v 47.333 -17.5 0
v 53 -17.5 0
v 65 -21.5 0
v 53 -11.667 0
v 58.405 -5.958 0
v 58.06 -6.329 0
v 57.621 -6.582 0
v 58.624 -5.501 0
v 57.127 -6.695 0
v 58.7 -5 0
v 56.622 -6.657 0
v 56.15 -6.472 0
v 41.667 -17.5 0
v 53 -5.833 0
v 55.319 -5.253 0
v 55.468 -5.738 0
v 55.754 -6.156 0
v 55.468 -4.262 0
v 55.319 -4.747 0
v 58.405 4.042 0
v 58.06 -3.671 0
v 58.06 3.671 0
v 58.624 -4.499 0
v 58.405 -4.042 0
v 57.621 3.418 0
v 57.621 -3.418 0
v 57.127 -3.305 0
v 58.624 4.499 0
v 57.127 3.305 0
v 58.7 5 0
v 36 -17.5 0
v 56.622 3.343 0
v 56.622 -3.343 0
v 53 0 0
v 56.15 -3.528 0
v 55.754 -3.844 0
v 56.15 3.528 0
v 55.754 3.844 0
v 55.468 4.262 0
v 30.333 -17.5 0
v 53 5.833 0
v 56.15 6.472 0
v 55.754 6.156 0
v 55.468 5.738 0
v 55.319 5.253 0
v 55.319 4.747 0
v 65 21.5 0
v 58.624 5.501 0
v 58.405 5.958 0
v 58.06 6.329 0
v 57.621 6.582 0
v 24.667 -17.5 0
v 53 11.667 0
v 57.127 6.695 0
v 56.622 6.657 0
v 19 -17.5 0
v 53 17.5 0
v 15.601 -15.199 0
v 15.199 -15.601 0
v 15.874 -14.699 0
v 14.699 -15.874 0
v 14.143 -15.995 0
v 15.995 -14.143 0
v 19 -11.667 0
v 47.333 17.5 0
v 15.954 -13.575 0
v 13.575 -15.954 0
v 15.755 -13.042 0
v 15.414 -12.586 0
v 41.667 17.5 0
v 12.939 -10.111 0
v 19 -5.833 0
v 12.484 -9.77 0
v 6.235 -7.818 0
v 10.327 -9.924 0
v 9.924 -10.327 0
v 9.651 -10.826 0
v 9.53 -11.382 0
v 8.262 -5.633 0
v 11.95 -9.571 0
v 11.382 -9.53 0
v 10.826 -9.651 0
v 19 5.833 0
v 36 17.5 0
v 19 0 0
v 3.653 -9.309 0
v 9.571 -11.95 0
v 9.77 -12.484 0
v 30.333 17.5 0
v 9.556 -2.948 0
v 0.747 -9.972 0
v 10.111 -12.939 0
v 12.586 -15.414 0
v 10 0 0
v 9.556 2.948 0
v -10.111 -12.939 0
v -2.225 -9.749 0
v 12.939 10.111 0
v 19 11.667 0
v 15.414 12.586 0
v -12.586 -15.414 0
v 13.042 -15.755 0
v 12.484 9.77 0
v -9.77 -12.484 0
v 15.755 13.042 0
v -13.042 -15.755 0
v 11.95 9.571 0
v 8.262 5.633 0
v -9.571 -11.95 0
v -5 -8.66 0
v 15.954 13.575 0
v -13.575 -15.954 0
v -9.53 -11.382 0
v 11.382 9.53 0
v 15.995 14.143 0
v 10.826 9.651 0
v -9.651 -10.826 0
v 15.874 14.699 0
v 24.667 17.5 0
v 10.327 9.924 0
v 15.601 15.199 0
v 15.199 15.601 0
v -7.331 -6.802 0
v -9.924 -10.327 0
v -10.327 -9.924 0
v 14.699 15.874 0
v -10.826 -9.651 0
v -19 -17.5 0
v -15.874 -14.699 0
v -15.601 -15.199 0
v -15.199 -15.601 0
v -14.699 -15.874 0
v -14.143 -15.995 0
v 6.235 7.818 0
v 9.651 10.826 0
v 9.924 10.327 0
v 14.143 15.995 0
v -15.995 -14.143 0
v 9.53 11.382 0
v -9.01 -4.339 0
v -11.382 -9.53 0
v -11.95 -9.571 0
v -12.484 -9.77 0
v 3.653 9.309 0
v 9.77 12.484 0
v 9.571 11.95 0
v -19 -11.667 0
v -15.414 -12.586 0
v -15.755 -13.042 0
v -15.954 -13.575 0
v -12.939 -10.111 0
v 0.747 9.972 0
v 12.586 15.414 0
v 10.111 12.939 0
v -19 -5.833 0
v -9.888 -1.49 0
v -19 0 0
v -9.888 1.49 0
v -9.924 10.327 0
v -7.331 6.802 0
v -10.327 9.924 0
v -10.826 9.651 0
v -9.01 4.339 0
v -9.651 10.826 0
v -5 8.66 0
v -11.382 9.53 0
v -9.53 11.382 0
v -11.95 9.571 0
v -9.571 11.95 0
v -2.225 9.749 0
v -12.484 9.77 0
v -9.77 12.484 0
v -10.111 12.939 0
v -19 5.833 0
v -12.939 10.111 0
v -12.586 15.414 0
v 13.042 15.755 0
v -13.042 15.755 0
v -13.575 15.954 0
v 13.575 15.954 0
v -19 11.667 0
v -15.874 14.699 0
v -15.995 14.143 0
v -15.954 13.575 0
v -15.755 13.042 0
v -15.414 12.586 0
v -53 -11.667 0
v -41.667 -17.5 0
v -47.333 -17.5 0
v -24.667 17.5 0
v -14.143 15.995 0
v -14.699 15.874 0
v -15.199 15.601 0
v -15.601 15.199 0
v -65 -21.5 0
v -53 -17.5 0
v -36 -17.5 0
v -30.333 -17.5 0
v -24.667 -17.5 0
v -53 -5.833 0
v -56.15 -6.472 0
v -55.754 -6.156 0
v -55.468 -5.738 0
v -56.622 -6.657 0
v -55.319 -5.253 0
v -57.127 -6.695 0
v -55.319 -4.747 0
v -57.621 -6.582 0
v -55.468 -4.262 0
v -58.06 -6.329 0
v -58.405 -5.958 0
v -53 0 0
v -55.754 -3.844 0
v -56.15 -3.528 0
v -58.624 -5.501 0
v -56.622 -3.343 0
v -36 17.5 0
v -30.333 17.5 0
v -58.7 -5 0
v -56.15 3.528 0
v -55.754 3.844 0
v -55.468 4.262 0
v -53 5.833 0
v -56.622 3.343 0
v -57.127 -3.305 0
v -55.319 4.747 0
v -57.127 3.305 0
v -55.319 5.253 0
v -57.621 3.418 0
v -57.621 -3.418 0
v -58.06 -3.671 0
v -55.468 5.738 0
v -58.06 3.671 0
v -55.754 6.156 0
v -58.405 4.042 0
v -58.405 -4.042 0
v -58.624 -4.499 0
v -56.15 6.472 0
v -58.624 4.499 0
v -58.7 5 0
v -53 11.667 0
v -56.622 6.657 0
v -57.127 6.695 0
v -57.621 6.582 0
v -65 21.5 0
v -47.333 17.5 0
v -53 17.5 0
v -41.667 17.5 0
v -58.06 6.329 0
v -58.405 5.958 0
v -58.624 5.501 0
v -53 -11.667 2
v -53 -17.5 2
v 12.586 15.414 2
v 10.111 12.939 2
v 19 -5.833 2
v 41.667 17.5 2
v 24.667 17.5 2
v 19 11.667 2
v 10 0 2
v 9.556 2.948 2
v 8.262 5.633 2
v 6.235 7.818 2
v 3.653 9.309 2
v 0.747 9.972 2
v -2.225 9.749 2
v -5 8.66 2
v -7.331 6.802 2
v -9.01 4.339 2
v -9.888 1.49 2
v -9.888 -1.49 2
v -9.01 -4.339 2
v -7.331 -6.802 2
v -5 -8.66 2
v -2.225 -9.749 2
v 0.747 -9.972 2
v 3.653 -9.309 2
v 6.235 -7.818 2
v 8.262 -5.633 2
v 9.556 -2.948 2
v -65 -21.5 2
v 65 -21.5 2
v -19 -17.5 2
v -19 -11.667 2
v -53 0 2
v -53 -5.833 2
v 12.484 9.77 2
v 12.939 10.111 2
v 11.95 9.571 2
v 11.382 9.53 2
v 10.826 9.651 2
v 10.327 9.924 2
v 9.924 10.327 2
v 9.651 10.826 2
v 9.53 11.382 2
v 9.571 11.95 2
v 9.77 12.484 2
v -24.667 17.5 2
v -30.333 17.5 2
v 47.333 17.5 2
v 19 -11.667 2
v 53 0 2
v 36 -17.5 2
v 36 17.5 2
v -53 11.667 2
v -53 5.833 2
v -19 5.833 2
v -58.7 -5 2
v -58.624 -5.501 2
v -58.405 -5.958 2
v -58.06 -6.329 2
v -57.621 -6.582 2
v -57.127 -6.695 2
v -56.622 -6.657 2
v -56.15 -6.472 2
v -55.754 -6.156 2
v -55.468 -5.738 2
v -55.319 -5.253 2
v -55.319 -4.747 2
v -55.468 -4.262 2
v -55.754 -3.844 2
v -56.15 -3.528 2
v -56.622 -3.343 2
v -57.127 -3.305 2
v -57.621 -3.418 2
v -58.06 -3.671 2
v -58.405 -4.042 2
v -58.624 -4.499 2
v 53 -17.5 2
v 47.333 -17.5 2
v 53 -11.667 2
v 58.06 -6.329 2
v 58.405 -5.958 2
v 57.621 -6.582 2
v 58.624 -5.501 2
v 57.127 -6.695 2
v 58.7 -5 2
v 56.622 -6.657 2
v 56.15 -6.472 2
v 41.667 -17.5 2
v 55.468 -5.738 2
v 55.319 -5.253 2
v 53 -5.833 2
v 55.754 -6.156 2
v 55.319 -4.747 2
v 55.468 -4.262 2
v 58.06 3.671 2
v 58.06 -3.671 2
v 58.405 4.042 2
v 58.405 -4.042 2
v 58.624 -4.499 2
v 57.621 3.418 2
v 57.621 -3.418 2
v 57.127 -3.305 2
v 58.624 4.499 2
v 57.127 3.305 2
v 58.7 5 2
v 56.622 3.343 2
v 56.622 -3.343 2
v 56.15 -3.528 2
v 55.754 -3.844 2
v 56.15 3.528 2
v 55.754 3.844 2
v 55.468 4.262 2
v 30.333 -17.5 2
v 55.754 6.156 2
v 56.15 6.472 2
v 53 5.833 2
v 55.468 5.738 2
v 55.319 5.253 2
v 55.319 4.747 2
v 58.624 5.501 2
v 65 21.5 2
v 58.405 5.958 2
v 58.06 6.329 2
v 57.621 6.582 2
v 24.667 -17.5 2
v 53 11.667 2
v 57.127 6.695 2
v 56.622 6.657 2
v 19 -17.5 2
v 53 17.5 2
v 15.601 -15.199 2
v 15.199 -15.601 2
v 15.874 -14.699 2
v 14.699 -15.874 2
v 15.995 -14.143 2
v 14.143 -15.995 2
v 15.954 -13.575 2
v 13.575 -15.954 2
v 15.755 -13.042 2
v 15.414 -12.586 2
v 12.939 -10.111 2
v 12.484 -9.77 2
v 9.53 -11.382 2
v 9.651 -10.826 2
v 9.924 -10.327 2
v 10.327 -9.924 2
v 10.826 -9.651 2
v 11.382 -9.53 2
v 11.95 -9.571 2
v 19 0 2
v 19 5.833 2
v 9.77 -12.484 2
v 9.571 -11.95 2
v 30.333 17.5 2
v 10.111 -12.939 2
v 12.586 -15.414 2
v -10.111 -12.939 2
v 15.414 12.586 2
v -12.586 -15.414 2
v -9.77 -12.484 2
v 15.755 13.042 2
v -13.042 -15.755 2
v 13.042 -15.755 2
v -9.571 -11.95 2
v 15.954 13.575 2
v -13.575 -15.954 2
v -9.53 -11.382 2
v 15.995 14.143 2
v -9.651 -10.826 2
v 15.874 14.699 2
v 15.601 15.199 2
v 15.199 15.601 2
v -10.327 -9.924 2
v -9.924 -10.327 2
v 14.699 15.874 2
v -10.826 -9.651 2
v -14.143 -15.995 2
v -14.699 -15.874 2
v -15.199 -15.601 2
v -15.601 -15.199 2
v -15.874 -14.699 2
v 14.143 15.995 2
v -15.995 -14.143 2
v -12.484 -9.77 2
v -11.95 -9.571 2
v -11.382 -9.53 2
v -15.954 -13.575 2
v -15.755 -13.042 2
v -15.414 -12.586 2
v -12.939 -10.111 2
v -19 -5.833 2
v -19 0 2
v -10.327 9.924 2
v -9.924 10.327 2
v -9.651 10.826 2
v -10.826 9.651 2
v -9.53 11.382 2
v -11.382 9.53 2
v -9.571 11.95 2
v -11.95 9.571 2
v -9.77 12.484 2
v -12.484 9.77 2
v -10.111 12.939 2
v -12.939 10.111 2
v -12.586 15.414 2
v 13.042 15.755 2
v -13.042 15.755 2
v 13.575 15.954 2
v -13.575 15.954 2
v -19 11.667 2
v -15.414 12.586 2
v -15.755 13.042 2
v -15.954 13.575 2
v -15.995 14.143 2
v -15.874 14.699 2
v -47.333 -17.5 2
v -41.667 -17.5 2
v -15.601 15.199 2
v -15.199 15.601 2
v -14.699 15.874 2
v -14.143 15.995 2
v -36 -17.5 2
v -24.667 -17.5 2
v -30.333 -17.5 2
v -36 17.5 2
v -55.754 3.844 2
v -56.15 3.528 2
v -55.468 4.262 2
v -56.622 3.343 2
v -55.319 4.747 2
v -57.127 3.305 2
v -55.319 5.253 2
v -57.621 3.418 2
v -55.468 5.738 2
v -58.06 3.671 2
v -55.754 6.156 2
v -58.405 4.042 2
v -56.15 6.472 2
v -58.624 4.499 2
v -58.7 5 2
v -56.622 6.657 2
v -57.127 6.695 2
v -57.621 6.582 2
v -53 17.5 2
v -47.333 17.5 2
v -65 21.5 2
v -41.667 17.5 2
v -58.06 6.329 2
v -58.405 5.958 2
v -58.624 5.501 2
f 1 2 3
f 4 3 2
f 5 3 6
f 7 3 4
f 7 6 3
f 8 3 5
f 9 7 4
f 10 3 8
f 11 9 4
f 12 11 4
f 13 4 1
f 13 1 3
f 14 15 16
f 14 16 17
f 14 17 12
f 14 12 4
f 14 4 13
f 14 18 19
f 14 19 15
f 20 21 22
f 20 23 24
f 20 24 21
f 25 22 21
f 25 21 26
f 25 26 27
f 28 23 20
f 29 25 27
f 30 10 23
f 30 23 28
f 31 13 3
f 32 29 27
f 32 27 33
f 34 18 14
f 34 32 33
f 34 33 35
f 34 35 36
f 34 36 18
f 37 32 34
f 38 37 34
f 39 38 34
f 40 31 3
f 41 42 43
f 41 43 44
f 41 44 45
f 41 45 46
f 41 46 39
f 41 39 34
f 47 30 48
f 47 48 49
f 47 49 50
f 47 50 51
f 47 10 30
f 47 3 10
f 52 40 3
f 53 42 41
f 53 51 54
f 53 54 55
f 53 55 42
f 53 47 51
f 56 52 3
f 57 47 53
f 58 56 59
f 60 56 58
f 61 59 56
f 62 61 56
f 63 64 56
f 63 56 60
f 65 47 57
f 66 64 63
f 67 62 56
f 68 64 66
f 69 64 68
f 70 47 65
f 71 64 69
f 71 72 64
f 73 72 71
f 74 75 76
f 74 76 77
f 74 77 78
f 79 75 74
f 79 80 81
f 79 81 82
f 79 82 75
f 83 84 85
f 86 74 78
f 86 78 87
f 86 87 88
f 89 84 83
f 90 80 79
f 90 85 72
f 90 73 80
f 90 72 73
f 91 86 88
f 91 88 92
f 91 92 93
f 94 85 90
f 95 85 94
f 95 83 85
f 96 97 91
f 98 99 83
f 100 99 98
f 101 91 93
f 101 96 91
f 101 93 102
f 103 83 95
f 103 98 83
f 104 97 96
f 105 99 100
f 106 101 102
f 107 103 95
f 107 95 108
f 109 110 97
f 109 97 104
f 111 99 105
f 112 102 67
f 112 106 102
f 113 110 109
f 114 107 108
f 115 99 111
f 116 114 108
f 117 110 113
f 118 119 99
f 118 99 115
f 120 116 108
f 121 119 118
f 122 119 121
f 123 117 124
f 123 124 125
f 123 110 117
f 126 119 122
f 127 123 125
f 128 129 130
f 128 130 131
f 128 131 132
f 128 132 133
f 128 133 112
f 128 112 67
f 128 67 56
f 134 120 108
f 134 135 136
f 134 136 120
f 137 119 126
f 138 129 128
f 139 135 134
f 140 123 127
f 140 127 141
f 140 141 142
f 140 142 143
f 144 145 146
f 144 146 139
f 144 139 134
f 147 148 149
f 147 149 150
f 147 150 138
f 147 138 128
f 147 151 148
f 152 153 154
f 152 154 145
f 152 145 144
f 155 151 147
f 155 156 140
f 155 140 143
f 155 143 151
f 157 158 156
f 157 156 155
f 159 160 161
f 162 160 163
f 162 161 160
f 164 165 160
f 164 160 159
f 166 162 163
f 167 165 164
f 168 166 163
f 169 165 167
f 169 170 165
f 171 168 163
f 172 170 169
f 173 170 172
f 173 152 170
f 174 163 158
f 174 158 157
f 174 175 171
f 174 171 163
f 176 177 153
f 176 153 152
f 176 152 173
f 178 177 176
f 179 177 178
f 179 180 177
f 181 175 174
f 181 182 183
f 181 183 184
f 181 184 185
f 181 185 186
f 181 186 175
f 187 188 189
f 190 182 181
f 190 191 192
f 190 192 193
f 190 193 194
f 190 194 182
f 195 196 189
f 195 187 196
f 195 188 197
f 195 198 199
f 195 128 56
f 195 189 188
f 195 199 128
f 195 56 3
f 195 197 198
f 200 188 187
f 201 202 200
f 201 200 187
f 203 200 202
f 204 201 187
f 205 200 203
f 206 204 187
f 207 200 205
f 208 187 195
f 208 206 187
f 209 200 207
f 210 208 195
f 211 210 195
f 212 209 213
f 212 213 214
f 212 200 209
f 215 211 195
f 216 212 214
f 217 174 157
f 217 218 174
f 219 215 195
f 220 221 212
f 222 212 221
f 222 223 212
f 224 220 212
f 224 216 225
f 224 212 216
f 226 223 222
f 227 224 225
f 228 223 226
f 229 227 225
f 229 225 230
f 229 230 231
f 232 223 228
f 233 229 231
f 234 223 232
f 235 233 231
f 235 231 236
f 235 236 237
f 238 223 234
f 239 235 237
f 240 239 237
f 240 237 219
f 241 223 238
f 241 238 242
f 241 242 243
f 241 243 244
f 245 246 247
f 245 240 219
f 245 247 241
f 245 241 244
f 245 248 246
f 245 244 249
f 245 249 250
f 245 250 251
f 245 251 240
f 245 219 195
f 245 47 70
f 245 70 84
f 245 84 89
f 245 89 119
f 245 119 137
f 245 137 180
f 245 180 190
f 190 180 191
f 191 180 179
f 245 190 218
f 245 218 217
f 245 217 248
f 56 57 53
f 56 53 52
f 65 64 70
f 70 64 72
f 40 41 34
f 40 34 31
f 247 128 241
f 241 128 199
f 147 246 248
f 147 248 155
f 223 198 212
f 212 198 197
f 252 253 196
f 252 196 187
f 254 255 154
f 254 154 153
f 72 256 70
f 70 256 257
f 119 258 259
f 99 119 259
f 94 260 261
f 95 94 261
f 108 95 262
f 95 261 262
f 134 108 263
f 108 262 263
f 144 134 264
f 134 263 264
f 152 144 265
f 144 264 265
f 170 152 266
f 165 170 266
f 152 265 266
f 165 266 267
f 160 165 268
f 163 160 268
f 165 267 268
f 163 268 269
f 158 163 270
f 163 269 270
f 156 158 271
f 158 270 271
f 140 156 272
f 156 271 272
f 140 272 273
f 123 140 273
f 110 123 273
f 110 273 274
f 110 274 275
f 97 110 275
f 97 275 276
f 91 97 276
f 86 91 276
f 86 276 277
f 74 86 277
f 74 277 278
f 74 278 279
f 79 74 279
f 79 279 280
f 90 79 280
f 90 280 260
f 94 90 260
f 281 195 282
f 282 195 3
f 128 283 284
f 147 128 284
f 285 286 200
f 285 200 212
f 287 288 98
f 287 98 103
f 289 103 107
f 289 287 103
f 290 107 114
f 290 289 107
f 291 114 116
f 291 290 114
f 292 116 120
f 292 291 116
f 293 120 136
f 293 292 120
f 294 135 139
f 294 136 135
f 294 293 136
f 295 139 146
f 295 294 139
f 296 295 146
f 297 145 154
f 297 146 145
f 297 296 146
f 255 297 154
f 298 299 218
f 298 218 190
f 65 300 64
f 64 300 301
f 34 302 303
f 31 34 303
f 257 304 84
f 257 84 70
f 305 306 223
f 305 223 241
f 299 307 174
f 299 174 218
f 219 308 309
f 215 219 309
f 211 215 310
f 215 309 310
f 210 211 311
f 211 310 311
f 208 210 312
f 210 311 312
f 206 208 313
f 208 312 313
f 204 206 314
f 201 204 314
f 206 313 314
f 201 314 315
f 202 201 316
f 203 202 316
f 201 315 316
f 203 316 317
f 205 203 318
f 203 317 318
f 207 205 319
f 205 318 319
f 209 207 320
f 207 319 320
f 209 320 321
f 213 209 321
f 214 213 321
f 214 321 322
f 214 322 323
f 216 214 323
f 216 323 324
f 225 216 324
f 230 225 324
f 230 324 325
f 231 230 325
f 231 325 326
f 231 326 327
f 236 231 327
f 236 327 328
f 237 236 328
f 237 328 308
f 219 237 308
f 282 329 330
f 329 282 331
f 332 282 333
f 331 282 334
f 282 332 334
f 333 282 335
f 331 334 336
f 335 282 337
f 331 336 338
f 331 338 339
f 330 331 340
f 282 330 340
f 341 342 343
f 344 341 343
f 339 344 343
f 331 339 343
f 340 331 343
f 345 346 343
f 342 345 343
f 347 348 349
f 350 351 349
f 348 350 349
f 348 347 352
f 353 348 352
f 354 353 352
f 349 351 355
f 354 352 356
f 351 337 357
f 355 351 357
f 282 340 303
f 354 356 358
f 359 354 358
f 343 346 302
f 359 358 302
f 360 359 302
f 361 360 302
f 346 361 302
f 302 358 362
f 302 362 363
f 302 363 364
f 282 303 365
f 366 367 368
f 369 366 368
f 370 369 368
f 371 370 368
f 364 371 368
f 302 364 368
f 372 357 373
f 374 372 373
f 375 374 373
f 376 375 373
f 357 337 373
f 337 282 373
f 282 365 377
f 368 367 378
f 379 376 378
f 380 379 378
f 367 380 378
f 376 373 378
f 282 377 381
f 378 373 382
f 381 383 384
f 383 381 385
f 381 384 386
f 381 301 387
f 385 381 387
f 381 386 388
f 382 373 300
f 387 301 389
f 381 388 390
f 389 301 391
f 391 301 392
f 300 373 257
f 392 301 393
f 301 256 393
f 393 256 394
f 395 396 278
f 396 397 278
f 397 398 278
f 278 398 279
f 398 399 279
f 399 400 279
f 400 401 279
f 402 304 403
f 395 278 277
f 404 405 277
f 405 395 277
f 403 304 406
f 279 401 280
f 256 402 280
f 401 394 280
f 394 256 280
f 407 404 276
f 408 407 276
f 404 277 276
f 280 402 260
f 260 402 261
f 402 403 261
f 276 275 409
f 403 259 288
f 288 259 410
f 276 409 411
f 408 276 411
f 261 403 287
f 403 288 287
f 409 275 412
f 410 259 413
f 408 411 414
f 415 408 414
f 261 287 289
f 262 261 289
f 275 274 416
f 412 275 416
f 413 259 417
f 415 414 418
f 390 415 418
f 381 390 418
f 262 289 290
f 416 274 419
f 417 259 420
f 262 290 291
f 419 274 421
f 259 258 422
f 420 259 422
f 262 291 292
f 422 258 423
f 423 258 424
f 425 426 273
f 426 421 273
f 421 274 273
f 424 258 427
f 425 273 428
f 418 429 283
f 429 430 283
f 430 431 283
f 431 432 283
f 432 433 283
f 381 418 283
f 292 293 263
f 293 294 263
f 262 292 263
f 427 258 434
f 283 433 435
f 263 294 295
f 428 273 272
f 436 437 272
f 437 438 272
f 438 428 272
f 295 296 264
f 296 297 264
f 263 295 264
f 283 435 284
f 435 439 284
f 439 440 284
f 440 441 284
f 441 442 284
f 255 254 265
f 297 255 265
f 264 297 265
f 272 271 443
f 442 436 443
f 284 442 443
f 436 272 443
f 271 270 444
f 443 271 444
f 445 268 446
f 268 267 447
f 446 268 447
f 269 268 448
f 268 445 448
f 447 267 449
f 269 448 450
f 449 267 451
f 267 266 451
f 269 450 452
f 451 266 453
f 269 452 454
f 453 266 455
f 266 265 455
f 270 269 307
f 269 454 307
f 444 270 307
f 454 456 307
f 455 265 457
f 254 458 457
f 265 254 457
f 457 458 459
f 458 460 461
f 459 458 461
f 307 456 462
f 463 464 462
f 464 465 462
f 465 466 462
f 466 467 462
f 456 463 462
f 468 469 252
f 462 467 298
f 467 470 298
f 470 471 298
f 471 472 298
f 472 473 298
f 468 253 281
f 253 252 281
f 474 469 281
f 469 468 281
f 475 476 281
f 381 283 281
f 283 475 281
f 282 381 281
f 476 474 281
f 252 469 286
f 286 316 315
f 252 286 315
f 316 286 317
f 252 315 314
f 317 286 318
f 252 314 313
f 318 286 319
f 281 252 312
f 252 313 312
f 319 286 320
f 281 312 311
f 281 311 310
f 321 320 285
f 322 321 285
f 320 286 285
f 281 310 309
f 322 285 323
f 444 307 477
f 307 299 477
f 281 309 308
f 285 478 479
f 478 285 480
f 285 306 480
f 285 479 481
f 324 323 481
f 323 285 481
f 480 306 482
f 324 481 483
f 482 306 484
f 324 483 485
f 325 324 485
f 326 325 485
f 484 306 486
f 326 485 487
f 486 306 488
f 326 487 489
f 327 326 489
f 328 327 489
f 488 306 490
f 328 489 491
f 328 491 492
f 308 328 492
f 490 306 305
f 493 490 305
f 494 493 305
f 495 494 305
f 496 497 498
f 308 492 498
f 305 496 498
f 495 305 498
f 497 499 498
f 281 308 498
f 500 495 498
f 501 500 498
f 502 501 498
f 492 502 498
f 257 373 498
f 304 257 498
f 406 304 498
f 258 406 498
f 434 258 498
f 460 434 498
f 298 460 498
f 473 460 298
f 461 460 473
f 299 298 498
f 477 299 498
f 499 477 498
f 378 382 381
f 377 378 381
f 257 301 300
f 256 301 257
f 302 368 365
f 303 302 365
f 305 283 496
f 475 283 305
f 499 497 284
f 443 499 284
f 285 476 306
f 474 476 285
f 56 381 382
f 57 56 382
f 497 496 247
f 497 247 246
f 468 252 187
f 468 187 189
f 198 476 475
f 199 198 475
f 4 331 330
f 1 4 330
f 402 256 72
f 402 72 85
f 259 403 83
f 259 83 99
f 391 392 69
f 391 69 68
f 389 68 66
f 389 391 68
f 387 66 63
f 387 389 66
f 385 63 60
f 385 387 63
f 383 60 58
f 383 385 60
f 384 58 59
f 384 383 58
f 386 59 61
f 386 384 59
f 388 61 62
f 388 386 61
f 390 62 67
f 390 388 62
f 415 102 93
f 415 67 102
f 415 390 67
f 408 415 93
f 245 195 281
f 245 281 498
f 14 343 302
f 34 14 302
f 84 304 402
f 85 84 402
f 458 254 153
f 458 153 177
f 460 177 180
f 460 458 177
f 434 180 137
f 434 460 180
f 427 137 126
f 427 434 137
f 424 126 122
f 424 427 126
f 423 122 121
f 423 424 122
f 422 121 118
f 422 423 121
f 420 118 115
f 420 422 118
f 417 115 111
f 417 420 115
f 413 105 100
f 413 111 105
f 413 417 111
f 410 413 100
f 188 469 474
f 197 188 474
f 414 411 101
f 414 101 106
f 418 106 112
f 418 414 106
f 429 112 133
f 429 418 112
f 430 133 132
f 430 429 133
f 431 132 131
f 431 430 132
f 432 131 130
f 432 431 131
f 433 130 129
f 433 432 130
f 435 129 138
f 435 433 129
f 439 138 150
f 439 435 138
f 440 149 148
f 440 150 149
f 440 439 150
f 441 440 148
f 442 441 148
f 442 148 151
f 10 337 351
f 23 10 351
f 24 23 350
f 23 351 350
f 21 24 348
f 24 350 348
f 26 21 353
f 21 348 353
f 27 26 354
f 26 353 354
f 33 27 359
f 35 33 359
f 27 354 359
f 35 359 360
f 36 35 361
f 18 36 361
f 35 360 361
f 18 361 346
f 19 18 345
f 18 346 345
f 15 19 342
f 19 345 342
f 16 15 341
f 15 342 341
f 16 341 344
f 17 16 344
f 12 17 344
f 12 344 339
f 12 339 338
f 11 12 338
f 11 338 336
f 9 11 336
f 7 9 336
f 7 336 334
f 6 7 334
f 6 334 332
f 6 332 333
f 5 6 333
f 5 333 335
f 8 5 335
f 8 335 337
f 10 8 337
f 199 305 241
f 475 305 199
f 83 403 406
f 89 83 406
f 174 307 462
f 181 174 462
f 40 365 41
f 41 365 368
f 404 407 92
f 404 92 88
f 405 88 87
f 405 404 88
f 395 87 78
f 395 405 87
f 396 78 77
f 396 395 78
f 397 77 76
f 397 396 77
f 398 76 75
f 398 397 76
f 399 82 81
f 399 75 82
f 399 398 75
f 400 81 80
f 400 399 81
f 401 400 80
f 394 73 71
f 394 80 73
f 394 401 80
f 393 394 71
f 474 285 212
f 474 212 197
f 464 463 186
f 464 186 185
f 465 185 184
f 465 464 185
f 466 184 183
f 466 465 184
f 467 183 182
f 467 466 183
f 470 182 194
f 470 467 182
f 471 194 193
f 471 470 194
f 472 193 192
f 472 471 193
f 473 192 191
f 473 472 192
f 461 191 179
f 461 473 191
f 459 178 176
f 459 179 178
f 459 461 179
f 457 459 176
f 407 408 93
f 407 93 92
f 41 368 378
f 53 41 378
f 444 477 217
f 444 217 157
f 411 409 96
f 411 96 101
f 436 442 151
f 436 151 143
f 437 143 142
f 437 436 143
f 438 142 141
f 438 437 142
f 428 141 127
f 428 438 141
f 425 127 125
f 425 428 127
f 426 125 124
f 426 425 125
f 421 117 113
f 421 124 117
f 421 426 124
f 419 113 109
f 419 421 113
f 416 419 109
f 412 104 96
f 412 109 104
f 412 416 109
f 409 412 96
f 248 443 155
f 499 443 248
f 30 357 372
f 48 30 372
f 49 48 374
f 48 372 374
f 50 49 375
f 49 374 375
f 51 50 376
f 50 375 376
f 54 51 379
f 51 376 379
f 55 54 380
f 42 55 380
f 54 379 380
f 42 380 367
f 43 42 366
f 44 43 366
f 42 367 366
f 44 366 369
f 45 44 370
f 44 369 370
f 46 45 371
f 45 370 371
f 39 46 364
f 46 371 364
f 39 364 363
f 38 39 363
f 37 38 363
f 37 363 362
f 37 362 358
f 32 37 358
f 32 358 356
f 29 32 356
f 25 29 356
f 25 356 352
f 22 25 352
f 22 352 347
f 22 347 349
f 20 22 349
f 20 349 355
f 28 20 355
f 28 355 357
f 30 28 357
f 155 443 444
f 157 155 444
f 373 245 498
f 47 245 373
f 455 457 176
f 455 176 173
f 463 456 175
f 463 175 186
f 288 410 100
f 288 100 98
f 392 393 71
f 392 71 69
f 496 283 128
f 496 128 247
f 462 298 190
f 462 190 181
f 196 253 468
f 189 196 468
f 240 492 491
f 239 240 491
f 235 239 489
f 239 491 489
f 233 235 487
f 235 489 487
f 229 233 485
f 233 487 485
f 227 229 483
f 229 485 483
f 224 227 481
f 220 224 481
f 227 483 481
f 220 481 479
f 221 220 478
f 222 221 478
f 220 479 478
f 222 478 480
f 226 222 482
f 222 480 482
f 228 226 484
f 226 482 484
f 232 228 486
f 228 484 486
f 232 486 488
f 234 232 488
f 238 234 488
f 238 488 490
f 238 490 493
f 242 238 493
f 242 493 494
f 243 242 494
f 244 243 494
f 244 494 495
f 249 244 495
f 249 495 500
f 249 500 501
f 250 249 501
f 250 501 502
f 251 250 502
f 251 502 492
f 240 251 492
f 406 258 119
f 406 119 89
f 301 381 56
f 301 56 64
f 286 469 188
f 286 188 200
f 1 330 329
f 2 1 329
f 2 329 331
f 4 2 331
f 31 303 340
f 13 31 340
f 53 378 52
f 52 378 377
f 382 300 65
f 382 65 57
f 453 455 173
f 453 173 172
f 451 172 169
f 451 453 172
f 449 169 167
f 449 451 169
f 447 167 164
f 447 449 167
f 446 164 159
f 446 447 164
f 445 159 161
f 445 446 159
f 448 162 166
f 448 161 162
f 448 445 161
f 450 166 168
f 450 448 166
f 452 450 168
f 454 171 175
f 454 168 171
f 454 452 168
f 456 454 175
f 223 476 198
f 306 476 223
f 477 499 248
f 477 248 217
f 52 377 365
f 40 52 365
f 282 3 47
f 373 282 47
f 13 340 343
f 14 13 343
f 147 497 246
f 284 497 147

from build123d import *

# Parameters (mm, degrees)
SKETCH_1_W          = 130
SKETCH_1_H          = 43
EXTRUDE_1_DEPTH     = 2
CUT_EXTRUDE_1_DEPTH = 69.492700341
SKETCH_3_R          = 1.7
CUT_EXTRUDE_2_DEPTH = 69.492700341
SKETCH_4_R          = 10
SKETCH_4_W          = 34
SKETCH_4_H          = 35
CUT_EXTRUDE_3_DEPTH = 69.492700341
EXTRUDE_2_DEPTH     = 2


with BuildPart() as part:
    # 草图1 → 凸台-拉伸1 (new body)
    with BuildSketch(Plane.XY):
        Rectangle(SKETCH_1_W, SKETCH_1_H)
    extrude(amount=EXTRUDE_1_DEPTH)

    # 草图2 → 切除-拉伸1 (cut, through all)
    with BuildSketch(Plane.XY.offset(2)):
        with BuildLine():
            Line((-12.585786438, 15.414213562), (-10.110912703, 12.939339828))
            ThreePointArc((-10.110912703, 12.939339828), (-10.110912703, 10.110912703), (-12.939339828, 10.110912703))
            Line((-12.939339828, 10.110912703), (-15.414213562, 12.585786438))
            ThreePointArc((-15.414213562, 12.585786438), (-15.414213562, 15.414213562), (-12.585786438, 15.414213562))
        make_face()
        with BuildLine():
            Line((15.414213562, 12.585786438), (12.939339828, 10.110912703))
            ThreePointArc((12.939339828, 10.110912703), (10.110912703, 10.110912703), (10.110912703, 12.939339828))
            Line((10.110912703, 12.939339828), (12.585786438, 15.414213562))
            ThreePointArc((12.585786438, 15.414213562), (15.414213562, 15.414213562), (15.414213562, 12.585786438))
        make_face()
        with BuildLine():
            Line((12.585786438, -15.414213562), (10.110912703, -12.939339828))
            ThreePointArc((10.110912703, -12.939339828), (10.110912703, -10.110912703), (12.939339828, -10.110912703))
            Line((12.939339828, -10.110912703), (15.414213562, -12.585786438))
            ThreePointArc((15.414213562, -12.585786438), (15.414213562, -15.414213562), (12.585786438, -15.414213562))
        make_face()
        with BuildLine():
            Line((-15.414213562, -12.585786438), (-12.939339828, -10.110912703))
            ThreePointArc((-12.939339828, -10.110912703), (-10.110912703, -10.110912703), (-10.110912703, -12.939339828))
            Line((-10.110912703, -12.939339828), (-12.585786438, -15.414213562))
            ThreePointArc((-12.585786438, -15.414213562), (-15.414213562, -15.414213562), (-15.414213562, -12.585786438))
        make_face()
    extrude(amount=-CUT_EXTRUDE_1_DEPTH, mode=Mode.SUBTRACT)

    # 草图3 → 切除-拉伸2 (cut, through all)
    with BuildSketch(Plane.XY.offset(2)):
        with Locations((57, 5)):
            Circle(SKETCH_3_R)
        with Locations((57, -5)):
            Circle(SKETCH_3_R)
        with Locations(Location((-57, -5, 0), (0, 0, 180))):
            Circle(SKETCH_3_R)
        with Locations(Location((-57, 5, 0), (0, 0, 180))):
            Circle(SKETCH_3_R)
    extrude(amount=-CUT_EXTRUDE_2_DEPTH, mode=Mode.SUBTRACT)

    # 草图4 → 切除-拉伸3 (cut, through all)
    with BuildSketch(Plane.XY.offset(2)):
        Circle(SKETCH_4_R)
        with Locations((-36, 0)):
            Rectangle(SKETCH_4_W, SKETCH_4_H)
        with Locations((36, 0)):
            Rectangle(SKETCH_4_W, SKETCH_4_H)
    extrude(amount=-CUT_EXTRUDE_3_DEPTH, mode=Mode.SUBTRACT)

    # 草图6 → 凸台-拉伸2 (add, through all)
    with BuildSketch(Plane.XY.offset(2)):
        Polygon((-19, -17.5), (-53, 17.5), (-53, 11.666666667), (-24.666666667, -17.5), align=None)
        Polygon((-41.666666667, 17.5), (-47.333333333, 17.5), (-19, -11.666666667), (-19, -5.833333333), align=None)
        Polygon((-30.333333333, -17.5), (-53, 5.833333333), (-53, 0), (-36, -17.5), align=None)
        Polygon((-30.333333333, 17.5), (-36, 17.5), (-19, 0), (-19, 5.833333333), align=None)
        Polygon((-41.666666667, -17.5), (-53, -5.833333333), (-53, -11.666666667), (-47.333333333, -17.5), align=None)
        Polygon((-19, 17.5), (-24.666666667, 17.5), (-19, 11.666666667), align=None)
    extrude_2 = extrude(amount=-EXTRUDE_2_DEPTH)

    # 镜向1: 凸台-拉伸2 across plane
    add(extrude_2.mirror(Plane(origin=(0, 0, 0), x_dir=(0, 0, 1), z_dir=(1, 0, 0))))


solid = part.part
